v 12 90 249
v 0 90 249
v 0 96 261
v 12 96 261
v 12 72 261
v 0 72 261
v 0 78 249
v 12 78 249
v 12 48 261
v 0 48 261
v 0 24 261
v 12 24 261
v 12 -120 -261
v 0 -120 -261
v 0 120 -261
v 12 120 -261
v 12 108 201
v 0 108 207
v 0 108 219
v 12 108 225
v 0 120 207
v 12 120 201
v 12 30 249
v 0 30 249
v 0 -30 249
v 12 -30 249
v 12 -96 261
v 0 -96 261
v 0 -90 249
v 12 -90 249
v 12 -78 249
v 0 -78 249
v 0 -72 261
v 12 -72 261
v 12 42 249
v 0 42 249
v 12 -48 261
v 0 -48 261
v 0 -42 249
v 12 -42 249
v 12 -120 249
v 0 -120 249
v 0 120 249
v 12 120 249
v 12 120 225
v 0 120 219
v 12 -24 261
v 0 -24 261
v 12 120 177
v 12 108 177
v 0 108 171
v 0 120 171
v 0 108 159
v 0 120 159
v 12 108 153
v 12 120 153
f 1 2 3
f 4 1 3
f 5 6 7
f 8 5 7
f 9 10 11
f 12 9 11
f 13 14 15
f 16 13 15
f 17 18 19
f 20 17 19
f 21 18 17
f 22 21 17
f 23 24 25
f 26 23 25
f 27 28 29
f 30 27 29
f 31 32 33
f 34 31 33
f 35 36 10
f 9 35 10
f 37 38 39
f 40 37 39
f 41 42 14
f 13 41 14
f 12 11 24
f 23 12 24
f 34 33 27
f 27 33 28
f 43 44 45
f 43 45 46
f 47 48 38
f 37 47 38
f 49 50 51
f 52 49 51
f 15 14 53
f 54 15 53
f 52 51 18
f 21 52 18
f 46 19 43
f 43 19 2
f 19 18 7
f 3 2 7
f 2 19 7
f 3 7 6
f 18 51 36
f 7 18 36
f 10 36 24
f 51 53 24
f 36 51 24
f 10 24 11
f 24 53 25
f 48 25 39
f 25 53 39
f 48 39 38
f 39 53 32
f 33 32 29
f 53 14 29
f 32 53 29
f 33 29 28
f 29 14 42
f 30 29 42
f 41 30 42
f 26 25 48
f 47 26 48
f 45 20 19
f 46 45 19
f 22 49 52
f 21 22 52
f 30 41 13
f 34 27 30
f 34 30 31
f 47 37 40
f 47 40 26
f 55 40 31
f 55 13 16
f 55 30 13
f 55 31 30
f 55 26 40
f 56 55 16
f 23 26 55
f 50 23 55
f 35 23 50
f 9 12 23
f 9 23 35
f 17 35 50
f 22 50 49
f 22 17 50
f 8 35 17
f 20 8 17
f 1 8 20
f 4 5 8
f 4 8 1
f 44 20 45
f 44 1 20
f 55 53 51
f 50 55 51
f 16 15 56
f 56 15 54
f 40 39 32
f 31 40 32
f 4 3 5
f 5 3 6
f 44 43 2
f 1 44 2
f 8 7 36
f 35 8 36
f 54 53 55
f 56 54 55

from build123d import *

# Parameters (mm, degrees)
F1_DEPTH = 12
F3_DEPTH = 12
F5_DEPTH = 12


with BuildPart() as f1:
    # F0 (on Right) → F1 (new body)
    with BuildSketch(Plane.YZ):
        Polygon((120, 225), (120, 249), (96, 249), (90, 249), (78, 249), (72, 249), (48, 249), (42, 249), (30, 249), (24, 249), (-24, 249), (-30, 249), (-42, 249), (-48, 249), (-72, 249), (-78, 249), (-90, 249), (-96, 249), (-120, 249), (-120, -261), (120, -261), (120, 153), (108, 153), (108, 177), (120, 177), (120, 201), (108, 201), (108, 225), align=None)
        Polygon((-78, 249), (-72, 261), (-96, 261), (-90, 249), align=None)
        Polygon((-30, 249), (-24, 261), (-48, 261), (-42, 249), align=None)
        Polygon((42, 249), (48, 261), (24, 261), (30, 249), align=None)
        Polygon((90, 249), (96, 261), (72, 261), (78, 249), align=None)
    extrude(amount=F1_DEPTH)

    # F2 (on face) → F3 (join)
    with BuildSketch(Plane(origin=(0, 108, 0), x_dir=(-1, 0, 0), z_dir=(0, 1, 0))):
        Polygon((0, 219), (0, 225), (-12, 225), align=None)
        Polygon((0, 207), (-12, 201), (0, 201), align=None)
    extrude(amount=F3_DEPTH)

    # F4 (on face) → F5 (join)
    with BuildSketch(Plane(origin=(0, 108, 0), x_dir=(-1, 0, 0), z_dir=(0, 1, 0))):
        Polygon((0, 177), (-12, 177), (0, 171), align=None)
        Polygon((0, 159), (-12, 153), (0, 153), align=None)
    extrude(amount=F5_DEPTH)


solid = f1.part
